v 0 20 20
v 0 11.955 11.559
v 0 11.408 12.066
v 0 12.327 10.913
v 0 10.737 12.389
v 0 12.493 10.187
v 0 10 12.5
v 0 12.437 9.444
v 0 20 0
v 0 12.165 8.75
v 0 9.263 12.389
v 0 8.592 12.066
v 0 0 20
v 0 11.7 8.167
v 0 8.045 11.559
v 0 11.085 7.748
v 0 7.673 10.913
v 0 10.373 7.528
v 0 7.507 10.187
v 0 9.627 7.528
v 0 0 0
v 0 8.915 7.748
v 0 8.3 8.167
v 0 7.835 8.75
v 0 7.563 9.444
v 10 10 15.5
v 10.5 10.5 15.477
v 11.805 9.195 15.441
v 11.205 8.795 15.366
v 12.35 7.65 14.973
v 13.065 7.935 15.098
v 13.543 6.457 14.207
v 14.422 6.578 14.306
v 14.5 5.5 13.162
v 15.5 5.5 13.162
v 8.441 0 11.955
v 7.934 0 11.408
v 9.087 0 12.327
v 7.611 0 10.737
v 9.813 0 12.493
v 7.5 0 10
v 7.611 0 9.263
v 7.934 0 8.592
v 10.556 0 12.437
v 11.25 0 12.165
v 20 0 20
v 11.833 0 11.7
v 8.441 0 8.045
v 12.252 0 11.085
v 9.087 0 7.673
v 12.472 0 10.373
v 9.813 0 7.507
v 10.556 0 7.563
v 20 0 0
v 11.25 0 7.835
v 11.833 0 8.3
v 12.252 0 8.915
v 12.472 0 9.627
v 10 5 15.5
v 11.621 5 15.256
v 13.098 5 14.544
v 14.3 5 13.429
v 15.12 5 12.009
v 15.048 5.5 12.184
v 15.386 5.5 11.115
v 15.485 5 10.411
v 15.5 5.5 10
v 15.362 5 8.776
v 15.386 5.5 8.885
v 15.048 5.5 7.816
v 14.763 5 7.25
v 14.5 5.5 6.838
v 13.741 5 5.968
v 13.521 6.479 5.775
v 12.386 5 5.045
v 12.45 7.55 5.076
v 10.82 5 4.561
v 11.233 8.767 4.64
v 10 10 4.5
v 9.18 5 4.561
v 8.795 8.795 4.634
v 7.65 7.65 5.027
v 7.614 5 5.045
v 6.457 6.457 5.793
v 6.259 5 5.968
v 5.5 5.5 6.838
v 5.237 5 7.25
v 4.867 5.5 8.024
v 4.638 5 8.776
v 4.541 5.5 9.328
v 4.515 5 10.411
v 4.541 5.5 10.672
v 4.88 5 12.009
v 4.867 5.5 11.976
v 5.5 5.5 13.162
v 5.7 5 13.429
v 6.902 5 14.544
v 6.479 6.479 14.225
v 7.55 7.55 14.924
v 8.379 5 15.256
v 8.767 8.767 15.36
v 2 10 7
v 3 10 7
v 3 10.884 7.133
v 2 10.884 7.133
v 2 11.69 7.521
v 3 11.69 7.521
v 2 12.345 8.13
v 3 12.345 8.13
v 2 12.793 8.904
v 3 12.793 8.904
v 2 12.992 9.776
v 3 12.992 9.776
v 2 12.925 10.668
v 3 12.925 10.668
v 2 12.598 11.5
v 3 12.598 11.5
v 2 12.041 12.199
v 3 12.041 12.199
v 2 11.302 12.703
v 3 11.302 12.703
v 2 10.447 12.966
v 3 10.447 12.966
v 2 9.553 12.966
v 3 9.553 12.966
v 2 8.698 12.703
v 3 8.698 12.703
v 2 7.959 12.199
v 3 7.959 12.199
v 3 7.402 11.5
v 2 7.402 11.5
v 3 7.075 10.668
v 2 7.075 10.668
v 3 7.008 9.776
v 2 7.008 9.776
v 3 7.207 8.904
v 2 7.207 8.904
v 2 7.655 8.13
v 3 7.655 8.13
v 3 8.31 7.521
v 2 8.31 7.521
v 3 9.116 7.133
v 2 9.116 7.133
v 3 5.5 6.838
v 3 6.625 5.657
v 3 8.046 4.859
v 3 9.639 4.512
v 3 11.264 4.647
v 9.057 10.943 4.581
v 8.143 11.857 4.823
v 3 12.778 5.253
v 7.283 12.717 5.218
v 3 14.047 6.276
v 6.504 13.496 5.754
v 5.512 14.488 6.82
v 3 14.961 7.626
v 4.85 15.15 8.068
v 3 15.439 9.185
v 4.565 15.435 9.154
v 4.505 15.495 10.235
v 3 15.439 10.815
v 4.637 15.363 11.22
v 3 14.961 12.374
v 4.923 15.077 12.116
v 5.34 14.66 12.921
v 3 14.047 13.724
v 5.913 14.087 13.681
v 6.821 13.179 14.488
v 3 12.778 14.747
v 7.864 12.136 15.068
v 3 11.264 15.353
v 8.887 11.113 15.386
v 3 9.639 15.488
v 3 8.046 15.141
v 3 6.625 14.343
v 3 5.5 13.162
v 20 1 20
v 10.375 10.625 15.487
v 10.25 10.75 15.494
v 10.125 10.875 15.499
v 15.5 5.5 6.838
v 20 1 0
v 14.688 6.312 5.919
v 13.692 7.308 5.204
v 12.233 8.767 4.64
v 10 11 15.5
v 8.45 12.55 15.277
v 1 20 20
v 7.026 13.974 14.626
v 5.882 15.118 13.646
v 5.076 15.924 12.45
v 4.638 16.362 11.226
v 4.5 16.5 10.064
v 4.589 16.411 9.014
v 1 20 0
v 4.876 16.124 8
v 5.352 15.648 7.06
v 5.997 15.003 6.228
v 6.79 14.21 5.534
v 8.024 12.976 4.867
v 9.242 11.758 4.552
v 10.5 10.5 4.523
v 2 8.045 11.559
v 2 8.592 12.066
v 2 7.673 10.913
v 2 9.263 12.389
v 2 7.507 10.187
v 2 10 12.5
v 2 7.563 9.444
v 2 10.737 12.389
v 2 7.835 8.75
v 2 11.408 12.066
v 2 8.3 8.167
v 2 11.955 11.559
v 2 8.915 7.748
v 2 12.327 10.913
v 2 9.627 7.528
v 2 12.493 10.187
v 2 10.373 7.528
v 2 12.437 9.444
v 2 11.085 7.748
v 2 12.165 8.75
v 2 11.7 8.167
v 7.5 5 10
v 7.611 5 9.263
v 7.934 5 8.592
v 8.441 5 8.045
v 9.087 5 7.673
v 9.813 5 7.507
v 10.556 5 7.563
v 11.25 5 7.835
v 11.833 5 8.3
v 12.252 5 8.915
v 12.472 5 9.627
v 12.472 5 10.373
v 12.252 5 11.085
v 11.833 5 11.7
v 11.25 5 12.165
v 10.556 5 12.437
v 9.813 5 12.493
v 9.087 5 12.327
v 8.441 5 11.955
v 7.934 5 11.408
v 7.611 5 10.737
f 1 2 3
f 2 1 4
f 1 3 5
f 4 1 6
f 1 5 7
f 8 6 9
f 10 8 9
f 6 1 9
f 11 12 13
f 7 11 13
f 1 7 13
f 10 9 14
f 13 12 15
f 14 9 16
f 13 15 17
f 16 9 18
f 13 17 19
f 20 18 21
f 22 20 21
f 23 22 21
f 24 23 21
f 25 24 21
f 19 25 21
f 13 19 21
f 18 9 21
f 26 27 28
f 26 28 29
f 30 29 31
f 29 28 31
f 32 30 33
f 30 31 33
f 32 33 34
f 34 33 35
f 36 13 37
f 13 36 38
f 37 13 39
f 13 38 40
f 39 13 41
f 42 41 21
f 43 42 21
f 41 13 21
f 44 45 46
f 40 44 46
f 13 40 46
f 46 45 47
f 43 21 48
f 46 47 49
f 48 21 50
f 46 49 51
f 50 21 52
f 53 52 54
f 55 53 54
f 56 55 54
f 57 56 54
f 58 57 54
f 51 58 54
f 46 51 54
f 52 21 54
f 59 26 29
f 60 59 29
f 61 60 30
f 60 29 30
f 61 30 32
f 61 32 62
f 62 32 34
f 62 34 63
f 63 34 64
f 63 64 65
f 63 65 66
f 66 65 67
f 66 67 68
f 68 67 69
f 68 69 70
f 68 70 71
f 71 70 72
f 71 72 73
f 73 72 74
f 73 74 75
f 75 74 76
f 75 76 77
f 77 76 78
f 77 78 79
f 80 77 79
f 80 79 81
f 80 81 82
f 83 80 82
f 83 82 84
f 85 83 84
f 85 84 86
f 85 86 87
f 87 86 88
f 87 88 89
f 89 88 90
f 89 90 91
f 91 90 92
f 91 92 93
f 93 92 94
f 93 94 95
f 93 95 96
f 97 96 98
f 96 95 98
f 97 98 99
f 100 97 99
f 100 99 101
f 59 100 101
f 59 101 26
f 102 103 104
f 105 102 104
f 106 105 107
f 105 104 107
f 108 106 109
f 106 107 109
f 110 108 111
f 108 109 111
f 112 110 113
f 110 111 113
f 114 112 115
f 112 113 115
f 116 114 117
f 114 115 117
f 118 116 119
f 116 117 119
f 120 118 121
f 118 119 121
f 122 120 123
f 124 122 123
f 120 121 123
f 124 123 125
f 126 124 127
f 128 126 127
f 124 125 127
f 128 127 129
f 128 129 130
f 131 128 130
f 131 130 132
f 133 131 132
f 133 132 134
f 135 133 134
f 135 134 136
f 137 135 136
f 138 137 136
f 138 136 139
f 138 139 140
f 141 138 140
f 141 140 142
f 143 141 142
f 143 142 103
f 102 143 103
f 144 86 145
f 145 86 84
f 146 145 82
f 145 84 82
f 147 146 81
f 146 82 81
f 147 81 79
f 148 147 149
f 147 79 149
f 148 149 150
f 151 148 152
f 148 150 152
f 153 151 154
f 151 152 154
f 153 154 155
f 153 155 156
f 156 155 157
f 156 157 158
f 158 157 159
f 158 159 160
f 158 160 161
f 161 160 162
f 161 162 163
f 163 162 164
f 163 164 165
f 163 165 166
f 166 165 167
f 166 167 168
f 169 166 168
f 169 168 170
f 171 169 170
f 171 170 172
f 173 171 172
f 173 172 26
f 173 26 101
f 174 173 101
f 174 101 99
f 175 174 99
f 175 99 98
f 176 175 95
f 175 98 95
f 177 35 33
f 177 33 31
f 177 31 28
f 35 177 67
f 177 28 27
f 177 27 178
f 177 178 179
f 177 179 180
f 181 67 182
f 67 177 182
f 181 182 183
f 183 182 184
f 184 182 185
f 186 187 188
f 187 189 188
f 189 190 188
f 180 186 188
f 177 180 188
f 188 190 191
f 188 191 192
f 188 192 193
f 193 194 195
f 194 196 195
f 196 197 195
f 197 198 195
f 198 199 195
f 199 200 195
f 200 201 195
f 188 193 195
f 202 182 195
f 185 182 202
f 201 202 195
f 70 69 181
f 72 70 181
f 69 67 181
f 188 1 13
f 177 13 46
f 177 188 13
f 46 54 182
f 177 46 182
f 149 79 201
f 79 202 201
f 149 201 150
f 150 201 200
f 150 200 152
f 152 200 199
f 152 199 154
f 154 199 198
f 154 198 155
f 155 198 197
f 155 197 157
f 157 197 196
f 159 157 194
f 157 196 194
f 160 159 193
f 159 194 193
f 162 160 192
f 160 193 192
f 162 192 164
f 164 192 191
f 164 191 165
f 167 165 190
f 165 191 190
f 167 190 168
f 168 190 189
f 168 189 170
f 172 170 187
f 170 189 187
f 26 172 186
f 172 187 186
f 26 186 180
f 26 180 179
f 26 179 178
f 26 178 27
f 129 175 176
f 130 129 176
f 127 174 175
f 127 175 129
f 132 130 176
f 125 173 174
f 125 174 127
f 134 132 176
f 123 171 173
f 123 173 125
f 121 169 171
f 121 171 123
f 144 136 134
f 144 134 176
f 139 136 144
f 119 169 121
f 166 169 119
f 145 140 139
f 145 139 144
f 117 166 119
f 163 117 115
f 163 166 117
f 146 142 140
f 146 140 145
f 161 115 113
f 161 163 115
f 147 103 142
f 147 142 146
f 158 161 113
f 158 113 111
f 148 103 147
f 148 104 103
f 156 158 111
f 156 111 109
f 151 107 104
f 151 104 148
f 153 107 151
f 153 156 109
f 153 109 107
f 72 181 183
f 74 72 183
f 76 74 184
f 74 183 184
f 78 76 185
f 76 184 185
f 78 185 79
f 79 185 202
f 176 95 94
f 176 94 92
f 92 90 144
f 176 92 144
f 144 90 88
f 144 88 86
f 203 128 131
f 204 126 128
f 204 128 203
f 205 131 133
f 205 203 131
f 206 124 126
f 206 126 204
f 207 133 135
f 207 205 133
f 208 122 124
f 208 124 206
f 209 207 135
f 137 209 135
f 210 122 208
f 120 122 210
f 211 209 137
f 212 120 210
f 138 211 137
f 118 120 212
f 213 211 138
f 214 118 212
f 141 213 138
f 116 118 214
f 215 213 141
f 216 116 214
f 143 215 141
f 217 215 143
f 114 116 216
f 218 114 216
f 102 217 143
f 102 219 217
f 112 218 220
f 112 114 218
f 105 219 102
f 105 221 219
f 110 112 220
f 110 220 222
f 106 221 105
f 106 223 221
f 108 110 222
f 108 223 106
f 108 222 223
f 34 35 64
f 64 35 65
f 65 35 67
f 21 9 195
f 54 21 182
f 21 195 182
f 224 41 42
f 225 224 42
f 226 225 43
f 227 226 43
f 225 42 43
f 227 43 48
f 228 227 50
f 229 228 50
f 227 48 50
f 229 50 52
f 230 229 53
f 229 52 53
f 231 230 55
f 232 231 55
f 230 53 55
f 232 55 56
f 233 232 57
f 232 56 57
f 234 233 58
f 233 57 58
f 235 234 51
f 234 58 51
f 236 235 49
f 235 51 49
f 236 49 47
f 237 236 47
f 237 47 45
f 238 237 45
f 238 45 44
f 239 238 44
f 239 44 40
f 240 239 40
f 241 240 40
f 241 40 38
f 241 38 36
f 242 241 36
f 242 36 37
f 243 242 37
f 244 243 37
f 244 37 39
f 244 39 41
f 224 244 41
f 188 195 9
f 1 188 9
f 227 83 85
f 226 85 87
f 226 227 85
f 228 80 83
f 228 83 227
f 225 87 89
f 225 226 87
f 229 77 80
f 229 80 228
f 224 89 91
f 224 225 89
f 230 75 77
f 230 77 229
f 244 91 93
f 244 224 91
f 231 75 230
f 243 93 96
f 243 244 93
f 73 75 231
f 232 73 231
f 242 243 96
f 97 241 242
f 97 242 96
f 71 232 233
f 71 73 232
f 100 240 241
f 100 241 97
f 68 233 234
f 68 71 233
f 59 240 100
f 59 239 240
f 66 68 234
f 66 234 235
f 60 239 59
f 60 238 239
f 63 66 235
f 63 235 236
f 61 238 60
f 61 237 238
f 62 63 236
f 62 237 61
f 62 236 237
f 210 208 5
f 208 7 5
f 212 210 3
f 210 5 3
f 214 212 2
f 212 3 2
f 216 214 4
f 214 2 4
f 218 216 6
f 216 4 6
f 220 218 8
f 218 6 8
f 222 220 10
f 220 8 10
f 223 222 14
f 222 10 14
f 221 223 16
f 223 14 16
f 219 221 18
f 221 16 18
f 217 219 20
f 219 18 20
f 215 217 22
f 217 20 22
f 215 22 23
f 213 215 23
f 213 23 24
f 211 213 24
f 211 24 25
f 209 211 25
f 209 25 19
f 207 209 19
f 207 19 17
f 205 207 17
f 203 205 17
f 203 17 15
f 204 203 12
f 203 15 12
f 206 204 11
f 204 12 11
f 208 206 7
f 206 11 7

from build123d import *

# Parameters (mm, degrees)
EXTRUDE_1_DEPTH           = 20
SKETCH_2_R                = 5.5
CUT_EXTRUDE_1_DEPTH       = 15
CUT_EXTRUDE_2_DEPTH       = 17
HOLE_WIZARD_M6_1_D        = 5
HOLE_WIZARD_1_D           = 5
HOLE_WIZARD_1_DEPTH       = 14
HOLE_WIZARD_1_CBORE_D     = 6
HOLE_WIZARD_1_CBORE_DEPTH = 1
HOLE_WIZARD_1_TIP         = 1.502151548


with BuildPart() as part:
    # 草图1 → 凸台-拉伸1 (new body)
    with BuildSketch(Plane.XY):
        Polygon((0, 0), (20, 0), (20, 1), (1, 20), (0, 20), align=None)
    extrude(amount=EXTRUDE_1_DEPTH)

    # 草图2 → 切除-拉伸1 (cut)
    with BuildSketch(Plane(origin=(0, 20, 0), x_dir=(1, 0, 0), z_dir=(0, 1, 0))):
        with Locations(Location((10, -10, 0), (0, 0, 270))):
            Circle(SKETCH_2_R)
    extrude(amount=-CUT_EXTRUDE_1_DEPTH, mode=Mode.SUBTRACT)

    # 草图3 → 切除-拉伸2 (cut)
    with BuildSketch(Plane(origin=(20, 0, 0), x_dir=(0, 0, -1), z_dir=(1, 0, 0))):
        with BuildLine():
            Line((-13.16227766, 5.5), (-6.83772234, 5.5))
            ThreePointArc((-6.83772234, 5.5), (-10, 15.5), (-13.16227766, 5.5))
        make_face()
    extrude(amount=-CUT_EXTRUDE_2_DEPTH, mode=Mode.SUBTRACT)

    # M6 螺纹孔1 (through all)
    with Locations(Plane(origin=(0, 5, 0), x_dir=(1, 0, 0), z_dir=(0, 1, 0))):
        with Locations((10, -10)):
            Hole(HOLE_WIZARD_M6_1_D / 2)

    # 打孔尺寸(%根据)内六角圆柱头螺钉的类型1
    with Locations(Plane(origin=(3, 0, 0), x_dir=(0, 0, -1), z_dir=(1, 0, 0))):
        with Locations((-10, 10)):
            CounterBoreHole(HOLE_WIZARD_1_D / 2, HOLE_WIZARD_1_CBORE_D / 2, HOLE_WIZARD_1_CBORE_DEPTH, depth=HOLE_WIZARD_1_DEPTH)
            with Locations((0, 0, -(HOLE_WIZARD_1_DEPTH + HOLE_WIZARD_1_TIP / 2))):  # 118° drill point
                Cone(0, HOLE_WIZARD_1_D / 2, HOLE_WIZARD_1_TIP, mode=Mode.SUBTRACT)


solid = part.part
